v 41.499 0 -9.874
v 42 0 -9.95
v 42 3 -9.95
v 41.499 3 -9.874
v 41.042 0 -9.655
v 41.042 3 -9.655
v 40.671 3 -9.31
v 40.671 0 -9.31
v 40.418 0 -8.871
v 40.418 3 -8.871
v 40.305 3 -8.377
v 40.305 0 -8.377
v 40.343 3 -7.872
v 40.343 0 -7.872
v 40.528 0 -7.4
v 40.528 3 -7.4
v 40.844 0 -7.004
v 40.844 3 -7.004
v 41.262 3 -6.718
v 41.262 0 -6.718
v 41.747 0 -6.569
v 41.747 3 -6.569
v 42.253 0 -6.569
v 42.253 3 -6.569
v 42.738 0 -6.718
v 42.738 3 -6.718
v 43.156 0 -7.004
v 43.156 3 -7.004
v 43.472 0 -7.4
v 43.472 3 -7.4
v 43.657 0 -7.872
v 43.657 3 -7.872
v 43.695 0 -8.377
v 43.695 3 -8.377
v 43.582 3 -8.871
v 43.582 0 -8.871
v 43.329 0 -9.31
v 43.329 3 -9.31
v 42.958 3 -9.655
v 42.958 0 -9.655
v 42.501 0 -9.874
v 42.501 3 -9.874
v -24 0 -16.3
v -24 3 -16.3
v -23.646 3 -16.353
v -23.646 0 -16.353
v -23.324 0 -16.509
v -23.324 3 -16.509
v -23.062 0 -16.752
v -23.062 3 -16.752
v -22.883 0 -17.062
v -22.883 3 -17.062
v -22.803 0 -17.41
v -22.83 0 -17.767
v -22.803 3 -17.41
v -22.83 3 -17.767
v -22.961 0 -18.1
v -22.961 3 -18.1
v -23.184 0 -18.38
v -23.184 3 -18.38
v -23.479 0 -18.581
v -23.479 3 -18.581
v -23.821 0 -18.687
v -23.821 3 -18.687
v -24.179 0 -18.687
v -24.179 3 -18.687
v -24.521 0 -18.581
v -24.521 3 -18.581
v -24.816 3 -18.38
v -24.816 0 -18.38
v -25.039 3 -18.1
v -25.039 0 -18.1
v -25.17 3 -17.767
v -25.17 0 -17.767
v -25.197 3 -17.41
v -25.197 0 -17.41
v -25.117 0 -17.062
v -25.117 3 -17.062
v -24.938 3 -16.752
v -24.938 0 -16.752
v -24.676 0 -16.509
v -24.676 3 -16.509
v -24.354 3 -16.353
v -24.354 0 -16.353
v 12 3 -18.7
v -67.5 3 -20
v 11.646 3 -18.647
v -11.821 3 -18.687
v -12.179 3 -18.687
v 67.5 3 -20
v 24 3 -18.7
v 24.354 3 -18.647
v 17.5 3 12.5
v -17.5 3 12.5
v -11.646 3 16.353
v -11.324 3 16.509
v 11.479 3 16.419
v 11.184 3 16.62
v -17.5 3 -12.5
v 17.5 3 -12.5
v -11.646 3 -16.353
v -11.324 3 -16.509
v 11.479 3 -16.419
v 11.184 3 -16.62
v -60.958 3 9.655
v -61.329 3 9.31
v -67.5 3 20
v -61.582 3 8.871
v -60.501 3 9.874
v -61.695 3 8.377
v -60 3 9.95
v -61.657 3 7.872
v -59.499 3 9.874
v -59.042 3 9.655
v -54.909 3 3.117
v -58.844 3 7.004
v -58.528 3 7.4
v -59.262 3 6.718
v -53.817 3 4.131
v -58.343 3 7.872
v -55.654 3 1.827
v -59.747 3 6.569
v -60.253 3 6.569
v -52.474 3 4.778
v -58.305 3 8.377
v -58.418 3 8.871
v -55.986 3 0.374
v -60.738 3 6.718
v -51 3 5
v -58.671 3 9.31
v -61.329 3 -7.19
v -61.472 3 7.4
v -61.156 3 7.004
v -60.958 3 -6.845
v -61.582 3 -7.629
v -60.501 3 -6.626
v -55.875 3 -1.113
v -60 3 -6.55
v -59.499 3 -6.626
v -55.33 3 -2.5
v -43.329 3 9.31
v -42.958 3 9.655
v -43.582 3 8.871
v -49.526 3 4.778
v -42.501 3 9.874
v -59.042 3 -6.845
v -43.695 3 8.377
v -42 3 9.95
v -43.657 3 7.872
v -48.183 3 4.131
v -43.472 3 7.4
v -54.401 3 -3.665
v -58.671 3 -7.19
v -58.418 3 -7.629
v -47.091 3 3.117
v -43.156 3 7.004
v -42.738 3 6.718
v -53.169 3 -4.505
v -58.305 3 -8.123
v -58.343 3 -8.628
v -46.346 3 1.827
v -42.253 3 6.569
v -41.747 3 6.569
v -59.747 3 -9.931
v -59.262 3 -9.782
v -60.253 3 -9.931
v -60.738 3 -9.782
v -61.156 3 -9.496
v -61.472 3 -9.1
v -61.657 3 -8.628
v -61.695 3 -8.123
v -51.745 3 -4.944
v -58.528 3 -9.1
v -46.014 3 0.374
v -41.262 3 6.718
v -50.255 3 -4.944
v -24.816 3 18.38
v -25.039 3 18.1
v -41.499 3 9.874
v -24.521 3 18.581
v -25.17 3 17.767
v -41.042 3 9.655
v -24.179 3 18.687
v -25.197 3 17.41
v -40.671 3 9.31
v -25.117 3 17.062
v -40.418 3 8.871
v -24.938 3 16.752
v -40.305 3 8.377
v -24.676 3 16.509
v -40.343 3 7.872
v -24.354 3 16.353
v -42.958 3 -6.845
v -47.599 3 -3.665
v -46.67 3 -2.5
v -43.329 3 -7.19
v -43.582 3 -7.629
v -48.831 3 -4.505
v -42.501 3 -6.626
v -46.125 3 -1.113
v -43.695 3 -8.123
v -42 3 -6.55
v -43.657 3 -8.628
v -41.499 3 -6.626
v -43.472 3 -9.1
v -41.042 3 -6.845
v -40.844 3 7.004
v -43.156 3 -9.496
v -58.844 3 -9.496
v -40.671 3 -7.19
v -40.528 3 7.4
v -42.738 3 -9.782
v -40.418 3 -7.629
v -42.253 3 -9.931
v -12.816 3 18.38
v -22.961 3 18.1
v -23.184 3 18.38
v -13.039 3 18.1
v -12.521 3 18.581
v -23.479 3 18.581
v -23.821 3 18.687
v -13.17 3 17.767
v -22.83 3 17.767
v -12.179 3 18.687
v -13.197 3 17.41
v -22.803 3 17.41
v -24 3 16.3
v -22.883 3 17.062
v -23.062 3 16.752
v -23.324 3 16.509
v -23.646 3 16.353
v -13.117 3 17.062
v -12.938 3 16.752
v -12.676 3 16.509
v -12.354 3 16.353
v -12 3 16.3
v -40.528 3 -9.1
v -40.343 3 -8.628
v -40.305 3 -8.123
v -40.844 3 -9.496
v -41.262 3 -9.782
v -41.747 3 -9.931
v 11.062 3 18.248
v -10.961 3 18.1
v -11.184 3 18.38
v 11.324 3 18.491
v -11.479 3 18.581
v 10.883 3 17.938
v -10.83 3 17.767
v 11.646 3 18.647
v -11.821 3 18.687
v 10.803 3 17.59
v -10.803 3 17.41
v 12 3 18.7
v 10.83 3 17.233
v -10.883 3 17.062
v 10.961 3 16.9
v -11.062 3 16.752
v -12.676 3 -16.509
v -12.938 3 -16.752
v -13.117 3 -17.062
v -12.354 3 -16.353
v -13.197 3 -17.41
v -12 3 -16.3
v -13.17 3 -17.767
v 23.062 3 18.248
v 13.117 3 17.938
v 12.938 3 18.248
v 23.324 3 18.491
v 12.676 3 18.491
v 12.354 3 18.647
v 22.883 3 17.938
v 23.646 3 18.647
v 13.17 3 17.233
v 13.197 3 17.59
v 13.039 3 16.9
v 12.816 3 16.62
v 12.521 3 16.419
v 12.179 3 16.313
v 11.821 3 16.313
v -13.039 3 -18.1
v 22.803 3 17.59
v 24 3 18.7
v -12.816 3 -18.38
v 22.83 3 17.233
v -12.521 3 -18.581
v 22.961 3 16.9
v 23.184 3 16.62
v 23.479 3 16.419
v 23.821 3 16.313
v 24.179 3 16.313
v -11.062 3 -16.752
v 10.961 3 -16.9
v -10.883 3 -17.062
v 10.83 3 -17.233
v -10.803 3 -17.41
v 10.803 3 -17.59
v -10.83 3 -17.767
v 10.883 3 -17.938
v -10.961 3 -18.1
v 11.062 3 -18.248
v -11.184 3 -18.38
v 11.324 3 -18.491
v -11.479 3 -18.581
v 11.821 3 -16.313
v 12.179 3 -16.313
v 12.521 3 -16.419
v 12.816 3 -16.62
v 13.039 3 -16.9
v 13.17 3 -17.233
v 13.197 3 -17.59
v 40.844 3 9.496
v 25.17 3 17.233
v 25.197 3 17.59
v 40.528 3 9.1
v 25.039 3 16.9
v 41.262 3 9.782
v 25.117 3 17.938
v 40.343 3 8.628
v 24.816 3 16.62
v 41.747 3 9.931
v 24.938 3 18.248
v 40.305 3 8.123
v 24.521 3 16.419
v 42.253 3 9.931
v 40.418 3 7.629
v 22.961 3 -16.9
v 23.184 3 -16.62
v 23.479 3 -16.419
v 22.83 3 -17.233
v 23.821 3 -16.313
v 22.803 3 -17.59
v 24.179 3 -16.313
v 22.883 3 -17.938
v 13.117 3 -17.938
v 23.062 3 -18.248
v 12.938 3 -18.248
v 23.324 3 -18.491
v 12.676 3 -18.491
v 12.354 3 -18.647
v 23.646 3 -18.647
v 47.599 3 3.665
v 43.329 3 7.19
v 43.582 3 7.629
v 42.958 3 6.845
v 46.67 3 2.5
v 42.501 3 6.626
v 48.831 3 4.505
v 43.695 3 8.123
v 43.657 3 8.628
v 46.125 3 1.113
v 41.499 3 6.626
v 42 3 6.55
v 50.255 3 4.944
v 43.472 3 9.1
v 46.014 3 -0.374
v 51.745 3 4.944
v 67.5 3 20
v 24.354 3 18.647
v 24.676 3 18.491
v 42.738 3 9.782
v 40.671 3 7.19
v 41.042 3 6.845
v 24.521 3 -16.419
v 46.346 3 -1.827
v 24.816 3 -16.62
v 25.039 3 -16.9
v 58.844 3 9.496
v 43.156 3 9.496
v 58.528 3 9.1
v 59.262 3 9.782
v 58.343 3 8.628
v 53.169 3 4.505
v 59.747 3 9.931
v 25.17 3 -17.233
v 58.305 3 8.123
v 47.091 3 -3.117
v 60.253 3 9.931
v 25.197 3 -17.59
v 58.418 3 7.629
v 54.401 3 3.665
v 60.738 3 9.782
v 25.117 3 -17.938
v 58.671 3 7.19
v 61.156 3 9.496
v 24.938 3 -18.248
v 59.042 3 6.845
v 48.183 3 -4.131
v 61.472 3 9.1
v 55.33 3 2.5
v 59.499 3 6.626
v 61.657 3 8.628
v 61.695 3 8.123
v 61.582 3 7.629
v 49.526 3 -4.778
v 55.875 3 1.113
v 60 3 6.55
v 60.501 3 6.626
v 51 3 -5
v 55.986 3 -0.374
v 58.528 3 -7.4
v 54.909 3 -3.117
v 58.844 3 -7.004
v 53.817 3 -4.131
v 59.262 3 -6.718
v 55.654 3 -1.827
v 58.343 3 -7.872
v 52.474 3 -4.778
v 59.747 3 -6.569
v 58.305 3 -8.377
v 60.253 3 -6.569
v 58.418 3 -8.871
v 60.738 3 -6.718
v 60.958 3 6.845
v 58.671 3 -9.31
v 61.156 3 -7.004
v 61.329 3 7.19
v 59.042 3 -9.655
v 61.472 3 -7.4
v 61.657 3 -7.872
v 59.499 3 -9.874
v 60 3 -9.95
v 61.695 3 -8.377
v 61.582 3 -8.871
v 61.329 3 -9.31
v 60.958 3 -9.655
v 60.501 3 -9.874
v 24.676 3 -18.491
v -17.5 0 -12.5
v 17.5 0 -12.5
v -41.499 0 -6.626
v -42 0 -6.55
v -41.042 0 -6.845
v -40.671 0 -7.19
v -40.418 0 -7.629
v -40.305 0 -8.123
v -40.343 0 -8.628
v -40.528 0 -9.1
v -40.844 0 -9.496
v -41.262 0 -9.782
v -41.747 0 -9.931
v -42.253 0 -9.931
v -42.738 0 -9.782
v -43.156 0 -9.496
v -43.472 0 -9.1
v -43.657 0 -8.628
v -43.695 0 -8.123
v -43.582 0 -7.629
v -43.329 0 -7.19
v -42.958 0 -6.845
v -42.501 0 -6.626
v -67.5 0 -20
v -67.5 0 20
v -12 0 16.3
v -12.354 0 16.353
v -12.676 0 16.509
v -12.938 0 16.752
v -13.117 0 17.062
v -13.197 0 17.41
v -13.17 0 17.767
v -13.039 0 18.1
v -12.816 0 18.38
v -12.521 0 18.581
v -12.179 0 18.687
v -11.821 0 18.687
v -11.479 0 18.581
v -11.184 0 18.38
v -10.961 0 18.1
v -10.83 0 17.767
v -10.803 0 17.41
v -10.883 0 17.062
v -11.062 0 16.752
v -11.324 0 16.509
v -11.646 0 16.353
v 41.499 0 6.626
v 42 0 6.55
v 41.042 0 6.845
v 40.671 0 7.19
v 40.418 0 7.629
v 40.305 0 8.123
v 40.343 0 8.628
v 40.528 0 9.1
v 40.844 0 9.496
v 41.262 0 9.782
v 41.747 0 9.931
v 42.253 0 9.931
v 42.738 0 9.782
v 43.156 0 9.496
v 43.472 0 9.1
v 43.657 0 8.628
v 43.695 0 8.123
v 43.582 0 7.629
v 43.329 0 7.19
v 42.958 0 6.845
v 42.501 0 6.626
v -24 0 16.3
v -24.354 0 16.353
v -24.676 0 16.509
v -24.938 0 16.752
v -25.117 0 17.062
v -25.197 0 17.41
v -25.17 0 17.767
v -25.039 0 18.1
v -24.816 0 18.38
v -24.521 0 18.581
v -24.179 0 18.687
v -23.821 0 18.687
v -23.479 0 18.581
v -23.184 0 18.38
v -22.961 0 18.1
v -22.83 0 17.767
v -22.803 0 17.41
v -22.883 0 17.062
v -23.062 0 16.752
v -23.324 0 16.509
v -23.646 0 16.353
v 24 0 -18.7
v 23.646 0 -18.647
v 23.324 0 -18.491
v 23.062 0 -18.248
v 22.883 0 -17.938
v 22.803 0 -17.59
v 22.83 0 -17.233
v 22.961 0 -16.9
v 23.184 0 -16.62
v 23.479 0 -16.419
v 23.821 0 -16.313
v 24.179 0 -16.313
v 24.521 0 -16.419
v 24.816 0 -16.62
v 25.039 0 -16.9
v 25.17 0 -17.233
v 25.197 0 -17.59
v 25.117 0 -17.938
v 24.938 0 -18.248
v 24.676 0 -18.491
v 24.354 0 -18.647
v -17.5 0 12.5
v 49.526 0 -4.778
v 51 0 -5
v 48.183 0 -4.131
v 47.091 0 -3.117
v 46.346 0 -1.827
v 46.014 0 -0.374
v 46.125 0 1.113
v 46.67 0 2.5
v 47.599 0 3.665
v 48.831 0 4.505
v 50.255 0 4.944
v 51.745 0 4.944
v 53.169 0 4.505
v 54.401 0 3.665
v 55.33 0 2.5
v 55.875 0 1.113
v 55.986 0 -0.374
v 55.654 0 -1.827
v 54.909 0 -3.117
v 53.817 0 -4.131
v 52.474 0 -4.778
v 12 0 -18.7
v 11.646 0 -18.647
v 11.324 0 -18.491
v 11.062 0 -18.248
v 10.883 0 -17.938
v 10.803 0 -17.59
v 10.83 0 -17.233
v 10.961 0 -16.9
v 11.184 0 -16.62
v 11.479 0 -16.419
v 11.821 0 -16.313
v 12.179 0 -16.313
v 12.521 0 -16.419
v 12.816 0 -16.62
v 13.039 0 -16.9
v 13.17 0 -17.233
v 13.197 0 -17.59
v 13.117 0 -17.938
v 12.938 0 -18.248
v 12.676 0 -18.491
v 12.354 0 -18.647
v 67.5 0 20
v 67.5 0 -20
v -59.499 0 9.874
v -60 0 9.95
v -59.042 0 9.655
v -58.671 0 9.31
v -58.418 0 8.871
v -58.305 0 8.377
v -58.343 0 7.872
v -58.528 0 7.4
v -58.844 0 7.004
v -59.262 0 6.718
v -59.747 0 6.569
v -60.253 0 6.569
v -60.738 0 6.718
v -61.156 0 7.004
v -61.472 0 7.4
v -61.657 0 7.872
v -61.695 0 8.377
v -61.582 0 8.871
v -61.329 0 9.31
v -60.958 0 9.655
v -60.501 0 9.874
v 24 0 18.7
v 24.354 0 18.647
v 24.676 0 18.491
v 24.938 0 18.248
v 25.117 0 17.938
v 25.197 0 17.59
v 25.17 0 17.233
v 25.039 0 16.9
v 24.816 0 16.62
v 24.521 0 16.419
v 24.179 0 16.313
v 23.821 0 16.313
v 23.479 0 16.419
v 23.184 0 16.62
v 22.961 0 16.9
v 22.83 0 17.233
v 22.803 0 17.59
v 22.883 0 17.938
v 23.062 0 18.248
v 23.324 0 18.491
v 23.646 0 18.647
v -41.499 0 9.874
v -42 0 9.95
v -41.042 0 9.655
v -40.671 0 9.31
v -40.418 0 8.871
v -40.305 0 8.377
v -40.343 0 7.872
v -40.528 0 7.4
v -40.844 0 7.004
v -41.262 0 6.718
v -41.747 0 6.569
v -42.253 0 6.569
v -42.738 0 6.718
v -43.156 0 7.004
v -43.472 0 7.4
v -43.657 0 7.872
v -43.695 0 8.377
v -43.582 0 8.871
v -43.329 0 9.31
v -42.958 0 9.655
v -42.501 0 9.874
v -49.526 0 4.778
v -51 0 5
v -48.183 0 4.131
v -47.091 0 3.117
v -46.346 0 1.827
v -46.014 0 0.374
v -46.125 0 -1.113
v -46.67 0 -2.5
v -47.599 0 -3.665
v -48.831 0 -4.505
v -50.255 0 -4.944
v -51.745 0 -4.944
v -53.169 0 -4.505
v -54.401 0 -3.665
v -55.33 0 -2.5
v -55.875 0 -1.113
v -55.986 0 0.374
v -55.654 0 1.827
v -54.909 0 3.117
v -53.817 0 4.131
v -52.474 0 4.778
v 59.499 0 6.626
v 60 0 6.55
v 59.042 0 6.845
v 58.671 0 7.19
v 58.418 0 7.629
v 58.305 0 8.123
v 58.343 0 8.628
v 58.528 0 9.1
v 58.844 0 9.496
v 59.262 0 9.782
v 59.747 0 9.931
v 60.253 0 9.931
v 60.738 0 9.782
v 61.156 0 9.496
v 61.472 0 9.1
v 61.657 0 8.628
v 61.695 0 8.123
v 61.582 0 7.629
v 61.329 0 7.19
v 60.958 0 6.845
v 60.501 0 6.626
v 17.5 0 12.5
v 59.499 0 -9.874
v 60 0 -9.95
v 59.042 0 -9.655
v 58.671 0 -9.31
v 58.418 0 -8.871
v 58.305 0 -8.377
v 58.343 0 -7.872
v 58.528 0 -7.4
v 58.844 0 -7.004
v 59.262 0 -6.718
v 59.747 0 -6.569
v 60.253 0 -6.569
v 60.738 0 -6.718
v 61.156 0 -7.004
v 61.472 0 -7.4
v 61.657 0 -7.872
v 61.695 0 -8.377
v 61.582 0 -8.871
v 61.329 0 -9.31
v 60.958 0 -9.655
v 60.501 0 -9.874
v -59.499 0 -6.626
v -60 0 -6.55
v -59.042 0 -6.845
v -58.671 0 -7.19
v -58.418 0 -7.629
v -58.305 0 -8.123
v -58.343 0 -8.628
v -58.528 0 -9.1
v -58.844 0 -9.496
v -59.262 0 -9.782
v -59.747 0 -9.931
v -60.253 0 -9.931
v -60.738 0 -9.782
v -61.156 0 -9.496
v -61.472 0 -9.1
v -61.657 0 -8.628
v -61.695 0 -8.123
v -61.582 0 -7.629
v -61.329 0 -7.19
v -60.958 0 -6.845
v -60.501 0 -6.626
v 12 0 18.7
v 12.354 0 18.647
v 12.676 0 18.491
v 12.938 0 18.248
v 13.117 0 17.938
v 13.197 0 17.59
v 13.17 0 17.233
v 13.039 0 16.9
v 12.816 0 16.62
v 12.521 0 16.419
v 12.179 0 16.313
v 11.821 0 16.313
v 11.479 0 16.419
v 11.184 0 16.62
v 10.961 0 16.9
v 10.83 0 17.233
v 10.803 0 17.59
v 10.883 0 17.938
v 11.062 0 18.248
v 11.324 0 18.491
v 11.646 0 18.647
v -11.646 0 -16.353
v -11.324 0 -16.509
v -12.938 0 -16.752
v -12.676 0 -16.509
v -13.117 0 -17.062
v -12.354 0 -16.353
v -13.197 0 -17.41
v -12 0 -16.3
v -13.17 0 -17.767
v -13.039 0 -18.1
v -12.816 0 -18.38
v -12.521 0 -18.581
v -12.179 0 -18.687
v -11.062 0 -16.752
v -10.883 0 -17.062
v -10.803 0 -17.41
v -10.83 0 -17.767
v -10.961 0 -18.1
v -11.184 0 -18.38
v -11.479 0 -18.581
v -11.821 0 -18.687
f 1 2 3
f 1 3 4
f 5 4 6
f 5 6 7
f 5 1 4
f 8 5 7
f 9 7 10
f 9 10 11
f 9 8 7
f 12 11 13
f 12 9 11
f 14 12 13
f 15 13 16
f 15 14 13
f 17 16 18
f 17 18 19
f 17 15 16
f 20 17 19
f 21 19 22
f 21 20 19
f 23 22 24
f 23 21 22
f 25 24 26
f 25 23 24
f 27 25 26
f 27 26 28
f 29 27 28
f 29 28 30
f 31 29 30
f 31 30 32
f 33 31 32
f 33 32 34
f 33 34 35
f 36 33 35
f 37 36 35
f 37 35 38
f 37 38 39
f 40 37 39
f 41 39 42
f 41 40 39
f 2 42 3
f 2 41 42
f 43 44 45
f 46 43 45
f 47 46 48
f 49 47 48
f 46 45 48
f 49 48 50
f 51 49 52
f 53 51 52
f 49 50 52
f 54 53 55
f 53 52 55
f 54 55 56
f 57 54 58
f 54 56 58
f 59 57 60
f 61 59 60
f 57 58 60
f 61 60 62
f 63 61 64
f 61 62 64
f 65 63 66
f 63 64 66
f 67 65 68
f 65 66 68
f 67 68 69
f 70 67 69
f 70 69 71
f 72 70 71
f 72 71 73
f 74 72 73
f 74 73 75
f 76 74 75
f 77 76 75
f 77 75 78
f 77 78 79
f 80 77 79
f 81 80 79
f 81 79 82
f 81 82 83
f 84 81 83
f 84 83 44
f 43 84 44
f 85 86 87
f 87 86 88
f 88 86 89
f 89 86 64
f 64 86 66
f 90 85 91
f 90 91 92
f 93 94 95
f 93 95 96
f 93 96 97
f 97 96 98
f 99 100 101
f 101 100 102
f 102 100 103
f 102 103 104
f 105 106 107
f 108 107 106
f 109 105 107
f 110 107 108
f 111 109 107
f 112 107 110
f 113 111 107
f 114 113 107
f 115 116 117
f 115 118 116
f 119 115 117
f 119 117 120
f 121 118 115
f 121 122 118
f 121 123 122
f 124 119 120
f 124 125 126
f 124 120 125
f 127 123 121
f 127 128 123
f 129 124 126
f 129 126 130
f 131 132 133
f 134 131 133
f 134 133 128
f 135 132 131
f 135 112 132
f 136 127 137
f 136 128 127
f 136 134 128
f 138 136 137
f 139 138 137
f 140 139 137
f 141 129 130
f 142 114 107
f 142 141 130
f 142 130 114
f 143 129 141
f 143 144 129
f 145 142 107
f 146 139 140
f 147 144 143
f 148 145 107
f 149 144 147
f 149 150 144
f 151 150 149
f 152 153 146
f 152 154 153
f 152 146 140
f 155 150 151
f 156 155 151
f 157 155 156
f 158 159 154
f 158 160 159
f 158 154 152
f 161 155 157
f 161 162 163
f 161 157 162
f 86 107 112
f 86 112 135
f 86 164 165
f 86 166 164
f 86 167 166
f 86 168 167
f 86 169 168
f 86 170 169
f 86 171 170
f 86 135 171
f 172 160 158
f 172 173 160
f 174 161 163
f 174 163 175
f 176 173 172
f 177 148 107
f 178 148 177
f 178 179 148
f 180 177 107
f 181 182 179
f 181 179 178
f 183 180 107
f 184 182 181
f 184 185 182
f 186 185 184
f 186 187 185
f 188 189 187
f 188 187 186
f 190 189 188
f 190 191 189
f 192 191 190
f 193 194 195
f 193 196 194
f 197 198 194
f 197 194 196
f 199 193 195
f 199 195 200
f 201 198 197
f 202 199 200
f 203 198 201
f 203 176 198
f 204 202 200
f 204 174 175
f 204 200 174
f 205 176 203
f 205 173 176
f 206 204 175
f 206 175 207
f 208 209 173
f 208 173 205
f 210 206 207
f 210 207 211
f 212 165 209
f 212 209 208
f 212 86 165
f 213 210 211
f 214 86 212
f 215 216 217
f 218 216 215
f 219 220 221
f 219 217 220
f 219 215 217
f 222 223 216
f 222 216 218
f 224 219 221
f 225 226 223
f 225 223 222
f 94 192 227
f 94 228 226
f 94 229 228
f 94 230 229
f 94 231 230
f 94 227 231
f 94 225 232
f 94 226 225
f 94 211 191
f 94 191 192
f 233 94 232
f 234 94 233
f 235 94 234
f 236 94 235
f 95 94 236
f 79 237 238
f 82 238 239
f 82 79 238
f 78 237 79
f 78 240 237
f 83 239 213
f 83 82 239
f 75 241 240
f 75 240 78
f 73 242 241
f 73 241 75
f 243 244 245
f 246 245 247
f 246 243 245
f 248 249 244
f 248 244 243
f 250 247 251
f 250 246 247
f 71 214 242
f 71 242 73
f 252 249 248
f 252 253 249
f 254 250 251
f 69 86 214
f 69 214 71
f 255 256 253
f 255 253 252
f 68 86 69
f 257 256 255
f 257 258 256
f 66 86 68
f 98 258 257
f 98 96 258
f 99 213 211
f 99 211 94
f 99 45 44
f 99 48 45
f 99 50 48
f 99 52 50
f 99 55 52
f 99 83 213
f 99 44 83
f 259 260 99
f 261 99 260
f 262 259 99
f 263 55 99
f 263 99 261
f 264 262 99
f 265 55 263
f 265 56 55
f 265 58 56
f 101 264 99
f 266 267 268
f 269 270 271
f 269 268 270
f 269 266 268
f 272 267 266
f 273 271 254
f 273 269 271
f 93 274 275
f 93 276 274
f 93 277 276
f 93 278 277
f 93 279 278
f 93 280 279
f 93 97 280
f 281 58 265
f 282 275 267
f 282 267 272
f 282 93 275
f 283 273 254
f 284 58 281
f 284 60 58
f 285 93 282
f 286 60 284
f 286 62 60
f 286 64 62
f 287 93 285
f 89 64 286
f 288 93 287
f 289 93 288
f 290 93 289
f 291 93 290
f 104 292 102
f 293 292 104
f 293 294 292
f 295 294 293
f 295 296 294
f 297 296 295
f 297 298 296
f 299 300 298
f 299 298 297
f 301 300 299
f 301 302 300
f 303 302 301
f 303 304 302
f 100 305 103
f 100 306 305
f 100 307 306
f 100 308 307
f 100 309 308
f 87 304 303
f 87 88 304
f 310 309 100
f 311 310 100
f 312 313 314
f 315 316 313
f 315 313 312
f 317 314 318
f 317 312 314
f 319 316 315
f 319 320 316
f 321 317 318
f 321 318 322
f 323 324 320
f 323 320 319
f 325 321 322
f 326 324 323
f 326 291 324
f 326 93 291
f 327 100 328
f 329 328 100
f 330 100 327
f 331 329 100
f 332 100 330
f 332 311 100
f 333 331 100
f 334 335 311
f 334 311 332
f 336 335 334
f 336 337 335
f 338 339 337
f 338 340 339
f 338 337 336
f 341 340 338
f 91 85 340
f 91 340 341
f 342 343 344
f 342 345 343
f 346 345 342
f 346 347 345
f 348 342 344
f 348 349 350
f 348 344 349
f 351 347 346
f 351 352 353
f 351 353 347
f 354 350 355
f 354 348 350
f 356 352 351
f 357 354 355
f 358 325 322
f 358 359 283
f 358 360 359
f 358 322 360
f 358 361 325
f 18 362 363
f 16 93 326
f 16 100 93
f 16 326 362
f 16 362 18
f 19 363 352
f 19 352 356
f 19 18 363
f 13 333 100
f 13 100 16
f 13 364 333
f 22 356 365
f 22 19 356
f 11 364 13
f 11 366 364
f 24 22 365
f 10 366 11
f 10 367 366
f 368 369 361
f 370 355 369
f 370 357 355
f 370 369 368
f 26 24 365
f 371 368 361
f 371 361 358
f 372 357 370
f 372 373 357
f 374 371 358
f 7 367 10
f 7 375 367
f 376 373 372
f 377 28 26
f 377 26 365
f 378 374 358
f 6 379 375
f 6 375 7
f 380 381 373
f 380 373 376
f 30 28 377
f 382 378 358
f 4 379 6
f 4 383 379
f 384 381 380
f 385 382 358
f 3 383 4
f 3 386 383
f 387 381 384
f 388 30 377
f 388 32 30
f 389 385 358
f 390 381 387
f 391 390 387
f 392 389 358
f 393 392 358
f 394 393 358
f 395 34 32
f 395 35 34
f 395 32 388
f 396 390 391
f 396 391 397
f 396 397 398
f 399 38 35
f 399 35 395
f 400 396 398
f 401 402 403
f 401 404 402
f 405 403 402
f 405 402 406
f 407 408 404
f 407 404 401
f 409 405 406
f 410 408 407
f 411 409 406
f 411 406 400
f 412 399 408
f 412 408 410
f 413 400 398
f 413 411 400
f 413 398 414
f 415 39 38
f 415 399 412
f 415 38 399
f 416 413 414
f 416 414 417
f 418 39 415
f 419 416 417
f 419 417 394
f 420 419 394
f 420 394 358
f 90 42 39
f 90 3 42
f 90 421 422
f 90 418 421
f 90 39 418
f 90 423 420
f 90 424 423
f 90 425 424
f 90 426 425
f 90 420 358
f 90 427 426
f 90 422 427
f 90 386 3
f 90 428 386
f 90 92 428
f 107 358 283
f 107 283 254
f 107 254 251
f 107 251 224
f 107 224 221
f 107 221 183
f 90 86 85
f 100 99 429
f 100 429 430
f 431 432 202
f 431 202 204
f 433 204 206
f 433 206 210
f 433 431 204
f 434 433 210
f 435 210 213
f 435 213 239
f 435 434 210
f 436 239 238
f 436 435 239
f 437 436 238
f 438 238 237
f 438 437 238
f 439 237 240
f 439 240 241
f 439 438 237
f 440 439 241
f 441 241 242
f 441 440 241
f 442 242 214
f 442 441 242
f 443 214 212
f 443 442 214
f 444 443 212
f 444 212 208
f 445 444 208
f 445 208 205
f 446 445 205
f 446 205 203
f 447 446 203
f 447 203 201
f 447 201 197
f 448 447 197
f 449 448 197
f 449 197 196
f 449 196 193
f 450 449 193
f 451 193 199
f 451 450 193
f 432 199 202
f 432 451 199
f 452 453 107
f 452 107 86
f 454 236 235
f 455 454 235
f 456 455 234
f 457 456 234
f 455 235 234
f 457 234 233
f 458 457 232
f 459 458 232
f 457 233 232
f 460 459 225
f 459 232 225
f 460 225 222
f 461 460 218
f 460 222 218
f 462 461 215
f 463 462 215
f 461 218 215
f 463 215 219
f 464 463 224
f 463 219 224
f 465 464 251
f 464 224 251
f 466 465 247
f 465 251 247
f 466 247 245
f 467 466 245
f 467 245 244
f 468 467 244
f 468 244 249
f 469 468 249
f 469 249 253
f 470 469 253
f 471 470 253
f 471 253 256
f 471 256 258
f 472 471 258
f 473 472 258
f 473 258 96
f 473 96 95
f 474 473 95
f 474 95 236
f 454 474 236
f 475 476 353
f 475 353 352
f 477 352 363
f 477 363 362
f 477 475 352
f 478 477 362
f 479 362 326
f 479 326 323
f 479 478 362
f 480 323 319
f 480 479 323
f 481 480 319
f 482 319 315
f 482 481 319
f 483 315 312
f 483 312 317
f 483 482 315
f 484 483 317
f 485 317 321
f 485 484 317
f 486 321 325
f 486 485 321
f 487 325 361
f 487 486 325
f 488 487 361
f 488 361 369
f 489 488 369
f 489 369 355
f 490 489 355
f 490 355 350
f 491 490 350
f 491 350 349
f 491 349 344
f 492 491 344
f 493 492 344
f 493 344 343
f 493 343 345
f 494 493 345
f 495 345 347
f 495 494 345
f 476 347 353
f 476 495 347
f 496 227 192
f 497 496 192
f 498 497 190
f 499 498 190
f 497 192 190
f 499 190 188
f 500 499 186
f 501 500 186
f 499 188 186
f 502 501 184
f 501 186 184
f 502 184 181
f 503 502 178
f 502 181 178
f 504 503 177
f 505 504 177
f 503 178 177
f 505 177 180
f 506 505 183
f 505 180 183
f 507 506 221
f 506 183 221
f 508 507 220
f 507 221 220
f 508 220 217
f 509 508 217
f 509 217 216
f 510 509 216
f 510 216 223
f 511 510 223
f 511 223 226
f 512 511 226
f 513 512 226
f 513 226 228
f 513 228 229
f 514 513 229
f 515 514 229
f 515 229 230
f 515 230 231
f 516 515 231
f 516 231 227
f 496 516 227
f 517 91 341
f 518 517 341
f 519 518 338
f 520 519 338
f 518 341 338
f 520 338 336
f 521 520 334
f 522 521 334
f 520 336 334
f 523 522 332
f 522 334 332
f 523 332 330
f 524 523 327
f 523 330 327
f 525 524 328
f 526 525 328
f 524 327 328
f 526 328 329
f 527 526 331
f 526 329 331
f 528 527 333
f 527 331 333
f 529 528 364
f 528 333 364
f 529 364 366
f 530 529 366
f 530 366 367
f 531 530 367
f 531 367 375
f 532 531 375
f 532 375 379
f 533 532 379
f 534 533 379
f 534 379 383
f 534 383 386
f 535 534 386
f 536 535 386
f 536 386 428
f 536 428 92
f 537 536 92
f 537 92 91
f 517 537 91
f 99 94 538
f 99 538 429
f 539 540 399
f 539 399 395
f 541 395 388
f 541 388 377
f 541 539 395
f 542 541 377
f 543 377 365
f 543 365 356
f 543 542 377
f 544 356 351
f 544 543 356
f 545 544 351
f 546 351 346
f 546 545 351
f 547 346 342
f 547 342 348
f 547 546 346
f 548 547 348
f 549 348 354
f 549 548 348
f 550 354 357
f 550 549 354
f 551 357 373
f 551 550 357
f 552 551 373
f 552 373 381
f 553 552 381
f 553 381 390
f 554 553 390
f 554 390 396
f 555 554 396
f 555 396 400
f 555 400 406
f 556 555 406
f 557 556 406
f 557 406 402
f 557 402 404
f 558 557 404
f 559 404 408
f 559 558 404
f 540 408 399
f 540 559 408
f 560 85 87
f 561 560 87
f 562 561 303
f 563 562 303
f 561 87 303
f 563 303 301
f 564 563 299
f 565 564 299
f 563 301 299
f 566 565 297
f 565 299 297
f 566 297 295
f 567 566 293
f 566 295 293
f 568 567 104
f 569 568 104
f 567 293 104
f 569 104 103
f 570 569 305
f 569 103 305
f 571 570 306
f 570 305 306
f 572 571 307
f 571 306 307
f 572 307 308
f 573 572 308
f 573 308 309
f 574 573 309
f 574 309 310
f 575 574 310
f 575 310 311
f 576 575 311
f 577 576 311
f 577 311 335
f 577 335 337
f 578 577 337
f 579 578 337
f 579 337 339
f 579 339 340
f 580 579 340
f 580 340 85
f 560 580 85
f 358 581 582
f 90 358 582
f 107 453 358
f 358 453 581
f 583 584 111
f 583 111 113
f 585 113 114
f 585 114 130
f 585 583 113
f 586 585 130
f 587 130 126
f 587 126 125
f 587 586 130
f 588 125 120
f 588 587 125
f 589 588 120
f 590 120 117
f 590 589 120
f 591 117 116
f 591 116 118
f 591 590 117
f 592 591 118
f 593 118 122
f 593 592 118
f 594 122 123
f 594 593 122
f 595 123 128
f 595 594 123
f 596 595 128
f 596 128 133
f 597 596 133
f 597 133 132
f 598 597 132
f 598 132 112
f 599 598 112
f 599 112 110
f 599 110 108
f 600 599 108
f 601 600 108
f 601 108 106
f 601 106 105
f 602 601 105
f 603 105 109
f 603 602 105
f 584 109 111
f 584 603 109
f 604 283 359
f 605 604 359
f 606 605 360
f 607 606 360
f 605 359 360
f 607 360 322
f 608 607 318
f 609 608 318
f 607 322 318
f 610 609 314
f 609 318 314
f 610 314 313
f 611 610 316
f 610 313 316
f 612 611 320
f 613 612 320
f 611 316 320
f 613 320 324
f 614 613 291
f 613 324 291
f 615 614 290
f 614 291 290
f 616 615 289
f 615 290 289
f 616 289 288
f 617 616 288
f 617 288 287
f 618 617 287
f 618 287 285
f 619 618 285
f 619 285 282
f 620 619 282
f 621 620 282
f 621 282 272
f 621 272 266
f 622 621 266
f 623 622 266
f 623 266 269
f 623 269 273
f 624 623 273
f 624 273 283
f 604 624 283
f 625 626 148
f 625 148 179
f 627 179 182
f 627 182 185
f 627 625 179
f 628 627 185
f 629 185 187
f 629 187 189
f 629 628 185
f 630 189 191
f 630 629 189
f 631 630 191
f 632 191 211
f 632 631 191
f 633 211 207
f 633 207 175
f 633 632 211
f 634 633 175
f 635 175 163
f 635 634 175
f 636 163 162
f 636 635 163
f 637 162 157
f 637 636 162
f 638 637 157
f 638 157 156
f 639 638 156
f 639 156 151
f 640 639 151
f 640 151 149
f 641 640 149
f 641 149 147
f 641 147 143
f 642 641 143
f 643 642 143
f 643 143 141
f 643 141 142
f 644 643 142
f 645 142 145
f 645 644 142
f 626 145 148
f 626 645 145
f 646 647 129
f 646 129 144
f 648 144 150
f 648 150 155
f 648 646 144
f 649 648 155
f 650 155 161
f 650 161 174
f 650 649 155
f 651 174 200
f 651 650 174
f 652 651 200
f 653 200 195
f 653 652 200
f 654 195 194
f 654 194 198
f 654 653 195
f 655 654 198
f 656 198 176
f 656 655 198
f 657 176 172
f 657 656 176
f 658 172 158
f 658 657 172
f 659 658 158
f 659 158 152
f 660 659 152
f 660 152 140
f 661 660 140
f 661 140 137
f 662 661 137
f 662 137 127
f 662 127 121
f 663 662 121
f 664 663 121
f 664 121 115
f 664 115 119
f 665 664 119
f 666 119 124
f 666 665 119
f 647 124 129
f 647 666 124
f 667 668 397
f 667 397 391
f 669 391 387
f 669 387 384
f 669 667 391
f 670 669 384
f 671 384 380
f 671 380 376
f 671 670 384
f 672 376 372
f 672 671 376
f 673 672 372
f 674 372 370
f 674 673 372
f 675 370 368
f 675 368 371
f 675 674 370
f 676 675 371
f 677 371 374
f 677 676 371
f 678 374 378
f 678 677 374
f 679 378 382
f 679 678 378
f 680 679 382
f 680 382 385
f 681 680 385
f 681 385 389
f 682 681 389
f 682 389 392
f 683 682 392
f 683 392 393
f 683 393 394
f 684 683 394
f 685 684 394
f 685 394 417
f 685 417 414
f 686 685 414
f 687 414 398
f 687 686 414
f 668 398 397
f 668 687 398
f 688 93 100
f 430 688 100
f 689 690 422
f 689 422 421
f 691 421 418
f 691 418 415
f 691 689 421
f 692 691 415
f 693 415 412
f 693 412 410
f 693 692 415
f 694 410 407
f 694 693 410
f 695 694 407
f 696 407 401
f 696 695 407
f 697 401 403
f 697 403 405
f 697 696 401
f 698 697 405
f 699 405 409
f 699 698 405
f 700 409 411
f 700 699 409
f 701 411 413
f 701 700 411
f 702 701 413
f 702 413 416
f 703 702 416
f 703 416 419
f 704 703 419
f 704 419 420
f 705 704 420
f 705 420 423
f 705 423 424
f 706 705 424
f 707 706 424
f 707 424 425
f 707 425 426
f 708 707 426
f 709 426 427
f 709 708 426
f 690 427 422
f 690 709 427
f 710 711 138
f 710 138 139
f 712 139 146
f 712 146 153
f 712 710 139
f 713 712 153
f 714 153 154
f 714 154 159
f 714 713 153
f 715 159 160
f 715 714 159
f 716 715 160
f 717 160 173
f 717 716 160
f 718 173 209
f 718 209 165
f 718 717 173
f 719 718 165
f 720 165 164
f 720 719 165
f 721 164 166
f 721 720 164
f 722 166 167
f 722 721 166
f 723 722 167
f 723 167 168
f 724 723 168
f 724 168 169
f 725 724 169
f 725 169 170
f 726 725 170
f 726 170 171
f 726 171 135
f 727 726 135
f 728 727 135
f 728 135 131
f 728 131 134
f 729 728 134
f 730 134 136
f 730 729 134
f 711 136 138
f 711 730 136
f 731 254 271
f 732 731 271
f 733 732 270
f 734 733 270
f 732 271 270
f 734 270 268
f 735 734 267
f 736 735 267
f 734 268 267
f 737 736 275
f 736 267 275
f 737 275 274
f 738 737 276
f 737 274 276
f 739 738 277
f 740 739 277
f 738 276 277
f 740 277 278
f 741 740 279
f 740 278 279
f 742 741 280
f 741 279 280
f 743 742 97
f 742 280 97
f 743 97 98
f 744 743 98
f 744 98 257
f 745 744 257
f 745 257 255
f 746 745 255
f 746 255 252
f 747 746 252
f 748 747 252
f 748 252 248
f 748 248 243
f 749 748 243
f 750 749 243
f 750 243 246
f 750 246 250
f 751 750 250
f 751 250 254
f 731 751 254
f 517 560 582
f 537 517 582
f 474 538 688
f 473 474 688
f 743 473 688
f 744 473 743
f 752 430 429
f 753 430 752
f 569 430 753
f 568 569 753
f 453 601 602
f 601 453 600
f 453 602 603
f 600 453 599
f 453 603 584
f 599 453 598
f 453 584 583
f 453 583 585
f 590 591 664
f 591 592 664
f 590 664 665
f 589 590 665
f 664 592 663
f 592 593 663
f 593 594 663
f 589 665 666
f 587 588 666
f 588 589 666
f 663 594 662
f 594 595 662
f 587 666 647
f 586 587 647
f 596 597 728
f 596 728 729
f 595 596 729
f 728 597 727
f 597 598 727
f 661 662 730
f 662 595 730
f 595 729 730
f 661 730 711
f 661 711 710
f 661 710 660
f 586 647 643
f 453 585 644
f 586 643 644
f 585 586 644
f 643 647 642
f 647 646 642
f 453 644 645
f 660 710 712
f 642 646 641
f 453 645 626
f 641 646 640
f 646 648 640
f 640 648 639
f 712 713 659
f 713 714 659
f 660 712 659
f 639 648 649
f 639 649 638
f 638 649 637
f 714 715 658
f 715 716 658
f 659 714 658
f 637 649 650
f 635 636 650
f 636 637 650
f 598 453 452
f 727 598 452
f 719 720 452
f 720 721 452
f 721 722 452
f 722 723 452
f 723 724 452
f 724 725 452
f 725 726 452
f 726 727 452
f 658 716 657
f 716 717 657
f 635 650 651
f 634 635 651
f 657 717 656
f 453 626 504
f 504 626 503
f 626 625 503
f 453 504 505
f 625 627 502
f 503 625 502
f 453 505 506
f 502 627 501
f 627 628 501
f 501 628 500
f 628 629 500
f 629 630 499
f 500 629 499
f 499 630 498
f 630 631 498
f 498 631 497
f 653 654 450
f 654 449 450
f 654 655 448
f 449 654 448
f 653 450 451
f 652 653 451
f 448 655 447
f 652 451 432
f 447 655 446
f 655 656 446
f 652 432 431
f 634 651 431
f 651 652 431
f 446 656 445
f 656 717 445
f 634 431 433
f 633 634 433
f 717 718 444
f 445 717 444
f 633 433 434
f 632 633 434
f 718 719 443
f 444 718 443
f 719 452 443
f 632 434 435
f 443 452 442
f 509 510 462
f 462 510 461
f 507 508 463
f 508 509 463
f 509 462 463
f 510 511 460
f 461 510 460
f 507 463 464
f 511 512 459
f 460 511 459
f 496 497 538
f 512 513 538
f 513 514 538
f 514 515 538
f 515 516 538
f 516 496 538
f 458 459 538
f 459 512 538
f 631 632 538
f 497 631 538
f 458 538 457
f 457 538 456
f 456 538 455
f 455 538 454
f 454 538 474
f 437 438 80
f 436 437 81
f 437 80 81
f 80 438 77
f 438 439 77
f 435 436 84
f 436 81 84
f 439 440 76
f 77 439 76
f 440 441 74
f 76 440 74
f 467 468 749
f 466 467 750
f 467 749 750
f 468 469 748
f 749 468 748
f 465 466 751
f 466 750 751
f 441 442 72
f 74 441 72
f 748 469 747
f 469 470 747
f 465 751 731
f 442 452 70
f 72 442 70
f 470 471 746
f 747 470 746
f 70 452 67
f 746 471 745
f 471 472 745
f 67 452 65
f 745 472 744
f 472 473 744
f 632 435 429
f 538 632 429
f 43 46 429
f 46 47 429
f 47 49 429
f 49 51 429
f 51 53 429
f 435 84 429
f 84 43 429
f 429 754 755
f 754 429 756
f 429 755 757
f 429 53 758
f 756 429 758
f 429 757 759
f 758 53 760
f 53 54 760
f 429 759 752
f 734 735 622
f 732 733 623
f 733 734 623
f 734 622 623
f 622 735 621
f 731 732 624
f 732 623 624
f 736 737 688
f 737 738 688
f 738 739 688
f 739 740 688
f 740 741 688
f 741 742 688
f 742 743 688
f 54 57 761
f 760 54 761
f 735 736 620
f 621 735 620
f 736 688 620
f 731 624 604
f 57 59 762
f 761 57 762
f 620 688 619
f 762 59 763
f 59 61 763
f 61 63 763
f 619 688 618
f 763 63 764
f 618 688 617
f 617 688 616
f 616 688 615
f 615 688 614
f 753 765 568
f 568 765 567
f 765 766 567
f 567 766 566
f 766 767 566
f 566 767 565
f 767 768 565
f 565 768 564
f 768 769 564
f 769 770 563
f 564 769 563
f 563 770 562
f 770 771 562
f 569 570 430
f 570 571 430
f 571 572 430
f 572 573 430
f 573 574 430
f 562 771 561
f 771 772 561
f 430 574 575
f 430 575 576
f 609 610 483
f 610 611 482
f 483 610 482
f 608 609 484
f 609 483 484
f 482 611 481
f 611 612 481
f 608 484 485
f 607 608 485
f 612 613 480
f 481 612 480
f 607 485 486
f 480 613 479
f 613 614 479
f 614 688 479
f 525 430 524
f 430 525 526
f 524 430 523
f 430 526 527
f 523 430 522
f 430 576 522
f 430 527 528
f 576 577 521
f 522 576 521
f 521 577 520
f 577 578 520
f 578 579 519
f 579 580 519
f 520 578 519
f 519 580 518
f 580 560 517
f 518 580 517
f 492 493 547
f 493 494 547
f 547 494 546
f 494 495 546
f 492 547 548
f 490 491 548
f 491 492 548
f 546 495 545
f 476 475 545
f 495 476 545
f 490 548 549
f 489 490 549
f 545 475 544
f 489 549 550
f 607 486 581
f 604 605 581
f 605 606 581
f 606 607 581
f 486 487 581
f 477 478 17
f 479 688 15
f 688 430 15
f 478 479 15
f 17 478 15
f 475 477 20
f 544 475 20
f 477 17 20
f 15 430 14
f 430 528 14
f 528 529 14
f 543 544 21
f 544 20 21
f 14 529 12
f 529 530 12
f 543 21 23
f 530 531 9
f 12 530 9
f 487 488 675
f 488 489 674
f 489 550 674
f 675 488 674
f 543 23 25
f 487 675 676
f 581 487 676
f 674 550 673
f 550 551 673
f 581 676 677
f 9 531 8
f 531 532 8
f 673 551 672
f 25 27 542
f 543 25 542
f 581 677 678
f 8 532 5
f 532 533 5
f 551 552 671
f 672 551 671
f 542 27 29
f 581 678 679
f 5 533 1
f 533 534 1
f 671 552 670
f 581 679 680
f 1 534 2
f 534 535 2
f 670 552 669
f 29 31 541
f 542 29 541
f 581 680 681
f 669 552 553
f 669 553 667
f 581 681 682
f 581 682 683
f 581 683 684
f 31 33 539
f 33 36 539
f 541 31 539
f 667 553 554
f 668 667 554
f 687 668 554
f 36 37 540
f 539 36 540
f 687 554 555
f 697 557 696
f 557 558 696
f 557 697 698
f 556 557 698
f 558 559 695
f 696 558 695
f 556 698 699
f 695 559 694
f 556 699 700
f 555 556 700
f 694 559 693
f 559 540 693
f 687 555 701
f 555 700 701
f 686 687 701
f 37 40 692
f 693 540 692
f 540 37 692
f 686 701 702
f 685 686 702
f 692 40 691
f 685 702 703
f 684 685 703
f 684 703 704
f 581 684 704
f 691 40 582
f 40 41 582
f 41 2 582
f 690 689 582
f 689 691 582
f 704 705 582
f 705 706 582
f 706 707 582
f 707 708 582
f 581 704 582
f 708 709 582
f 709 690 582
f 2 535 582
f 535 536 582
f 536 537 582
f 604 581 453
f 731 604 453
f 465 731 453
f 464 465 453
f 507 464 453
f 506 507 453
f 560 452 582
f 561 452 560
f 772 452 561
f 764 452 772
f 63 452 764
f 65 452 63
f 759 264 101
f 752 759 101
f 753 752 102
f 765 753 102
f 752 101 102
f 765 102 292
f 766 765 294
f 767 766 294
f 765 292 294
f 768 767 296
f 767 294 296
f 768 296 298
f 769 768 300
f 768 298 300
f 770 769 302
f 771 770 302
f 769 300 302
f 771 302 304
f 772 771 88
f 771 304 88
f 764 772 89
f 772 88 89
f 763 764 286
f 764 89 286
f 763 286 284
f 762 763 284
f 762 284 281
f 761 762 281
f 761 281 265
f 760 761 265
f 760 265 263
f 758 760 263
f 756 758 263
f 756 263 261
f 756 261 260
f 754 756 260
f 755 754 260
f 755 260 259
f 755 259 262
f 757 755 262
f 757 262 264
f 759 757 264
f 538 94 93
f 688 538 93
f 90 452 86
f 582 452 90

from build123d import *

# Parameters (mm, degrees)
SKETCH1_W           = 135
SKETCH1_H           = 40
SKETCH1_R           = 5
SKETCH1_R_2         = 1.7
SKETCH1_W_2         = 10
SKETCH1_H_2         = 20
BOSS_EXTRUDE1_DEPTH = 3
SKETCH3_R           = 1.2
CUT_EXTRUDE1_DEPTH  = 71.464530084
SKETCH4_W           = 35
SKETCH4_H           = 25
CUT_EXTRUDE2_DEPTH  = 71.464530084


with BuildPart() as part:
    # Sketch1 → Boss-Extrude1 (new body)
    with BuildSketch(Plane(origin=(0, 0, 0), x_dir=(1, 0, 0), z_dir=(0, 1, 0))):
        Rectangle(SKETCH1_W, SKETCH1_H)
        with Locations(Location((-51, 0, 0), (0, 0, 270))):
            Circle(SKETCH1_R, mode=Mode.SUBTRACT)
        with Locations(Location((-60, 8.25, 0), (0, 0, 270))):
            Circle(SKETCH1_R_2, mode=Mode.SUBTRACT)
        with Locations(Location((-42, 8.25, 0), (0, 0, 270))):
            Circle(SKETCH1_R_2, mode=Mode.SUBTRACT)
        with Locations(Location((-42, -8.25, 0), (0, 0, 270))):
            Circle(SKETCH1_R_2, mode=Mode.SUBTRACT)
        with Locations(Location((-60, -8.25, 0), (0, 0, 270))):
            Circle(SKETCH1_R_2, mode=Mode.SUBTRACT)
        with Locations(Location((51, 0, 0), (0, 0, 90))):
            Circle(SKETCH1_R, mode=Mode.SUBTRACT)
        with Locations(Location((42, 8.25, 0), (0, 0, 90))):
            Circle(SKETCH1_R_2, mode=Mode.SUBTRACT)
        with Locations(Location((42, -8.25, 0), (0, 0, 90))):
            Circle(SKETCH1_R_2, mode=Mode.SUBTRACT)
        with Locations(Location((60, -8.25, 0), (0, 0, 90))):
            Circle(SKETCH1_R_2, mode=Mode.SUBTRACT)
        with Locations(Location((60, 8.25, 0), (0, 0, 90))):
            Circle(SKETCH1_R_2, mode=Mode.SUBTRACT)
        Rectangle(SKETCH1_W_2, SKETCH1_H_2, mode=Mode.SUBTRACT)
    extrude(amount=BOSS_EXTRUDE1_DEPTH)

    # Sketch3 → Cut-Extrude1 (cut, through all)
    with BuildSketch(Plane(origin=(0, 3, 0), x_dir=(1, 0, 0), z_dir=(0, 1, 0))):
        with Locations(Location((-12, 17.5, 0), (0, 0, 270))):
            Circle(SKETCH3_R)
        with Locations(Location((-12, -17.5, 0), (0, 0, 90))):
            Circle(SKETCH3_R)
        with Locations(Location((-24, 17.5, 0), (0, 0, 270))):
            Circle(SKETCH3_R)
        with Locations(Location((-24, -17.5, 0), (0, 0, 90))):
            Circle(SKETCH3_R)
        with Locations(Location((24, -17.5, 0), (0, 0, 270))):
            Circle(SKETCH3_R)
        with Locations(Location((24, 17.5, 0), (0, 0, 90))):
            Circle(SKETCH3_R)
        with Locations(Location((12, -17.5, 0), (0, 0, 270))):
            Circle(SKETCH3_R)
        with Locations(Location((12, 17.5, 0), (0, 0, 90))):
            Circle(SKETCH3_R)
    extrude(amount=-CUT_EXTRUDE1_DEPTH, mode=Mode.SUBTRACT)

    # Sketch4 → Cut-Extrude2 (cut, through all)
    with BuildSketch(Plane(origin=(0, 3, 0), x_dir=(1, 0, 0), z_dir=(0, 1, 0))):
        Rectangle(SKETCH4_W, SKETCH4_H)
    extrude(amount=-CUT_EXTRUDE2_DEPTH, mode=Mode.SUBTRACT)


solid = part.part
